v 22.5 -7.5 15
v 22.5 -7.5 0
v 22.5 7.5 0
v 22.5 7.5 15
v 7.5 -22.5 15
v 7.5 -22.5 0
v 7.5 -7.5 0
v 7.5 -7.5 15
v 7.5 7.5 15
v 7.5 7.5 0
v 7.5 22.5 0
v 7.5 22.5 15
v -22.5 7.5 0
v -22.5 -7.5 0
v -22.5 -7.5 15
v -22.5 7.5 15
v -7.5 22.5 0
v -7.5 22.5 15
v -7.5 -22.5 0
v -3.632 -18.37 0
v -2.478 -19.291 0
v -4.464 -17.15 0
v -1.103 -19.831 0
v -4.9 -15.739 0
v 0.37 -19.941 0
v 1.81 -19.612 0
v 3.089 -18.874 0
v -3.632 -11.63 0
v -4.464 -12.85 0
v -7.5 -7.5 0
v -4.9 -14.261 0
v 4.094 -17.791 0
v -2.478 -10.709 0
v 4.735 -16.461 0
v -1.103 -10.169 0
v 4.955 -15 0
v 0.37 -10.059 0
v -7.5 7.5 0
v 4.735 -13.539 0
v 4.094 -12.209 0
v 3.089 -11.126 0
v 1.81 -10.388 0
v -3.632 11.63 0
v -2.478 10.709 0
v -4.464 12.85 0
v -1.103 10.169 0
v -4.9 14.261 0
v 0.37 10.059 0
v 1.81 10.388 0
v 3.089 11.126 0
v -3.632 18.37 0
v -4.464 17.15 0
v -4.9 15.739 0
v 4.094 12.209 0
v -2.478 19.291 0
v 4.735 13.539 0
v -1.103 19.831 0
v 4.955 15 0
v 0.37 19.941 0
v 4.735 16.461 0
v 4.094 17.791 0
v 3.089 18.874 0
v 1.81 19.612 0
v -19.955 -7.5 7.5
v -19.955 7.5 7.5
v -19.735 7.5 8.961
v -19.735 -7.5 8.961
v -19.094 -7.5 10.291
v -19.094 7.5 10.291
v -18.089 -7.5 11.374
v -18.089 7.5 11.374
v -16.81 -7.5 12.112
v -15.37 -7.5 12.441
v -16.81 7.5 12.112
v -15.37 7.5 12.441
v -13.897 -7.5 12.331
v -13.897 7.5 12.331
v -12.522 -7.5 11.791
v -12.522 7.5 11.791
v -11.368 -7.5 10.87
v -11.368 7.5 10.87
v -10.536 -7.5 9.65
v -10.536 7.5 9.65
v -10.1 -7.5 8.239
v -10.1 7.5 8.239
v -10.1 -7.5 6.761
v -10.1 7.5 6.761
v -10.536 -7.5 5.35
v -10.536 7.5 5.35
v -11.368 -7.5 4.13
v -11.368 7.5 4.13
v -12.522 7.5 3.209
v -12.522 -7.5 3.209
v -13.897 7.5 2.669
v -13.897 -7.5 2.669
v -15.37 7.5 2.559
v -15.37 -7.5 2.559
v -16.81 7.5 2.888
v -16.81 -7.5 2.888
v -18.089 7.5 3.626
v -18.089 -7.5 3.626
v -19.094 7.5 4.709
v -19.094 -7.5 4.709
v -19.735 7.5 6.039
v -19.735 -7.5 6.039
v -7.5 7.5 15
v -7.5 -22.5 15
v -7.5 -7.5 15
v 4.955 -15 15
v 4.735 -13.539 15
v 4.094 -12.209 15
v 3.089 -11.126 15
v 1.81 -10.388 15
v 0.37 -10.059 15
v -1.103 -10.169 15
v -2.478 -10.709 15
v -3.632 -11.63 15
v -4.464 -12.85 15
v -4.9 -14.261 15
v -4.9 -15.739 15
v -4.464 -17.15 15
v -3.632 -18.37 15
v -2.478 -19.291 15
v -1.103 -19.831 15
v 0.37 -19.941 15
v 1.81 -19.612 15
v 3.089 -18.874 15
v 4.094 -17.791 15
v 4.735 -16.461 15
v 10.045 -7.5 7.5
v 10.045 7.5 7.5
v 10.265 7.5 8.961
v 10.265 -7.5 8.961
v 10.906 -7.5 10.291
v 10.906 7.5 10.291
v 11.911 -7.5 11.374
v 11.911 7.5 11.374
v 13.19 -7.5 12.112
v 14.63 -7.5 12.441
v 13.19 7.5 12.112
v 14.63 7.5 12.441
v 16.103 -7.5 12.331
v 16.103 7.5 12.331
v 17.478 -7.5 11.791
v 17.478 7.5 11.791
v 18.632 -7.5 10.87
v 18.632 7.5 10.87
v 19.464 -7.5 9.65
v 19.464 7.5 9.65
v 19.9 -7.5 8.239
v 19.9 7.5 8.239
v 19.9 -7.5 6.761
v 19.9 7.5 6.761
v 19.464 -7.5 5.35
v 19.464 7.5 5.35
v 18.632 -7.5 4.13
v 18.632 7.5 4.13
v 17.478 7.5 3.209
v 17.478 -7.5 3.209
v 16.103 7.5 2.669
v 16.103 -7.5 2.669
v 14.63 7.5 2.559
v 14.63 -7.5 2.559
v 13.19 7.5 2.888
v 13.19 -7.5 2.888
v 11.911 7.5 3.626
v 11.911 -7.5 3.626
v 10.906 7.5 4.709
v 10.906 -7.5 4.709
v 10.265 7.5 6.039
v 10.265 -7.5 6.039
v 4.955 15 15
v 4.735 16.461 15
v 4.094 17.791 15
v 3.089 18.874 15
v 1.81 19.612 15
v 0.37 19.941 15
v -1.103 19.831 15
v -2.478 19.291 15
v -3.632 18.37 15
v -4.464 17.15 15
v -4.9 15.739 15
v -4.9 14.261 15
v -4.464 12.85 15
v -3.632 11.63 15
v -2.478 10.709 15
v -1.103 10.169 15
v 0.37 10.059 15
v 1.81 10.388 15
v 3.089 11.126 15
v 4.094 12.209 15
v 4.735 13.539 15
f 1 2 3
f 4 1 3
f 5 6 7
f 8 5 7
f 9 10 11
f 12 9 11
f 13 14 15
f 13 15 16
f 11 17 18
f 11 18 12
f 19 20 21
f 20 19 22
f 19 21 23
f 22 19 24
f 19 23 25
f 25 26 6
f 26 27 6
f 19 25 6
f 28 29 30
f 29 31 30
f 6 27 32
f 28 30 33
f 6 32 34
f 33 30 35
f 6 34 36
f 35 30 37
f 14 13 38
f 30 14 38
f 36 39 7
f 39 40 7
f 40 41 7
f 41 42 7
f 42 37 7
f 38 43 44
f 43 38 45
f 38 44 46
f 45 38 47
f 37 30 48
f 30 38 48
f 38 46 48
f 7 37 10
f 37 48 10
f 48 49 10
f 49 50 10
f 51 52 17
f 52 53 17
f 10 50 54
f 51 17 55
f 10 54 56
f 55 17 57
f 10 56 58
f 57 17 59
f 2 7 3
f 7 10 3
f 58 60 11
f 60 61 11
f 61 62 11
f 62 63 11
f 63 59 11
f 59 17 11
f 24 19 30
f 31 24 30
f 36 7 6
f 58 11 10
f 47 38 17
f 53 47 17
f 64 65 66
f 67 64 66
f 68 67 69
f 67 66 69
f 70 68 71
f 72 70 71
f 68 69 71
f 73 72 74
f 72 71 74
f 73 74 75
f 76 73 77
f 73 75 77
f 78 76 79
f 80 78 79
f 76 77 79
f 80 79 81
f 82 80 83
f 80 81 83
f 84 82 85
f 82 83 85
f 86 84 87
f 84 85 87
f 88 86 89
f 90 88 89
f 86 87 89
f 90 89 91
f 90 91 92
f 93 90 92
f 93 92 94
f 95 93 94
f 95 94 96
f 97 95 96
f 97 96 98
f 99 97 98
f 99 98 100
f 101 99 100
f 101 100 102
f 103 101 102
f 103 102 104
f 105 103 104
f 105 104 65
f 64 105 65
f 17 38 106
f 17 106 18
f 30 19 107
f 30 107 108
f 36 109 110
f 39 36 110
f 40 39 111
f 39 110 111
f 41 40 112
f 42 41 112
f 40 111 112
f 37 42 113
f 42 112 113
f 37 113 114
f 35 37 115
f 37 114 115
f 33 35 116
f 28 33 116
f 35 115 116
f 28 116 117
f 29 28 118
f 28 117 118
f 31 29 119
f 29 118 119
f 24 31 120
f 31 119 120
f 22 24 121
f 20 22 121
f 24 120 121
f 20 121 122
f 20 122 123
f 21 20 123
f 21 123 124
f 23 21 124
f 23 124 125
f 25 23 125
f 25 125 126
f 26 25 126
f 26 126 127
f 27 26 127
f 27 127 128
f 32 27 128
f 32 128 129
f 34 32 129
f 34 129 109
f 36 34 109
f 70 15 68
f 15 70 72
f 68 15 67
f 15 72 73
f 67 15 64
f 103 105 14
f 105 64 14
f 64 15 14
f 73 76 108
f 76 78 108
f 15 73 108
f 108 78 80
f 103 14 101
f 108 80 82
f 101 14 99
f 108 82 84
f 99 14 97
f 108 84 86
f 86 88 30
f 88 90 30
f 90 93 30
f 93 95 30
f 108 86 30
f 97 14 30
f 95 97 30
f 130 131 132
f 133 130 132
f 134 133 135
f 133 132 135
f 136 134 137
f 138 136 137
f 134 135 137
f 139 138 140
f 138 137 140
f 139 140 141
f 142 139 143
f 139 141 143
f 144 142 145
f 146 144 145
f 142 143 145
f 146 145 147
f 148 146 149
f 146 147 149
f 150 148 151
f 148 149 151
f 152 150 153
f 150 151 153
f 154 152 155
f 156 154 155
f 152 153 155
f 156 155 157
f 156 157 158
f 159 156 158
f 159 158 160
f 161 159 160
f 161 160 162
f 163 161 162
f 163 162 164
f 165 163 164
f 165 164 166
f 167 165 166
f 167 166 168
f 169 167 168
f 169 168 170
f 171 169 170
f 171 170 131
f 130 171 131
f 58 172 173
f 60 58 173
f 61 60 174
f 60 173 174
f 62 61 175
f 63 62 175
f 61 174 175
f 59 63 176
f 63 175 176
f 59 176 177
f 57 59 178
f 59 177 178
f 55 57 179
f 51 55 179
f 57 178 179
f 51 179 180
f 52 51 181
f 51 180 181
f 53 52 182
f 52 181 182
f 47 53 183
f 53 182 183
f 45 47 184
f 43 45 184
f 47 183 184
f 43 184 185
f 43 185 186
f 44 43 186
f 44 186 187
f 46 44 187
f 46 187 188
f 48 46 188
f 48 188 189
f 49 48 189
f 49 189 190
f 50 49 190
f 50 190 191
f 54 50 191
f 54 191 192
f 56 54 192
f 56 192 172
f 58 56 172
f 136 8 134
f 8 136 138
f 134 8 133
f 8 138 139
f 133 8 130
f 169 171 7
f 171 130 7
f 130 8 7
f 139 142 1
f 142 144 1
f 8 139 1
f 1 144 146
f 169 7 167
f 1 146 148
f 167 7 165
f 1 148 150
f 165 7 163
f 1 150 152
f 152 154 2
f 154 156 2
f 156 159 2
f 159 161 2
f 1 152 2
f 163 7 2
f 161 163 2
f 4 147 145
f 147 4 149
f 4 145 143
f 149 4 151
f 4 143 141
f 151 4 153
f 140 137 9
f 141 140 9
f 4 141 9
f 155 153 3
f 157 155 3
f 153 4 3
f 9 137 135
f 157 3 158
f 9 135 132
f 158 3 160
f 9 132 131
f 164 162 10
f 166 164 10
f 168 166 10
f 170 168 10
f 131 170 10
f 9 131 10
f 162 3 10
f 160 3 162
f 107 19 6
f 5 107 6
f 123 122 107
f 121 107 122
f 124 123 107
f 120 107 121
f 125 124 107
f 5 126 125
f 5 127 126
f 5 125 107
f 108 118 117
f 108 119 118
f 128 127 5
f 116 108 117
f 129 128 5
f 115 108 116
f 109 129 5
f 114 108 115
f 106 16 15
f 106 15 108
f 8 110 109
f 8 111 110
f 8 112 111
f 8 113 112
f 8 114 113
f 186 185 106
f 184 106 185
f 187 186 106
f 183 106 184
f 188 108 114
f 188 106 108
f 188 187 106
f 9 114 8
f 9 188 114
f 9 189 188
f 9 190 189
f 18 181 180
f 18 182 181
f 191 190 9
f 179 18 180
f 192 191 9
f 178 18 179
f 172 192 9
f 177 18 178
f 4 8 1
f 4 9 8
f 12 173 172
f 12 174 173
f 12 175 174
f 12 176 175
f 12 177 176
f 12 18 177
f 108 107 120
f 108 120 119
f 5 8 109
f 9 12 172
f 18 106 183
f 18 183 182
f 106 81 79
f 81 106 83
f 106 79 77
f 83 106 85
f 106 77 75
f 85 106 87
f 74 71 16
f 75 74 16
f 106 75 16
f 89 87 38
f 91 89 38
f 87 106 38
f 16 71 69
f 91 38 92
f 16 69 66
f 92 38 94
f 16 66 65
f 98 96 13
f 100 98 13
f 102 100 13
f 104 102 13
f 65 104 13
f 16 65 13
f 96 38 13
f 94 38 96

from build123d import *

# Parameters (mm, degrees)
F0_W     = 15
F0_H     = 15
F1_DEPTH = 15
F2_R     = 4.955
F3_DEPTH = 15.001
F4_R     = 4.955
F5_DEPTH = 30.001


with BuildPart() as f1:
    # F0 (on Top) → F1 (new body)
    with BuildSketch(Plane.XY):
        with Locations((-15, 0)):
            Rectangle(F0_W, F0_H)
        Rectangle(F0_W, F0_H)
        with Locations((15, 0)):
            Rectangle(F0_W, F0_H)
        with Locations((0, 15)):
            Rectangle(F0_W, F0_H)
        with Locations((0, -15)):
            Rectangle(F0_W, F0_H)
    extrude(amount=F1_DEPTH)

    # F2 (on face) → F3 (cut, through all)
    with BuildSketch(Plane.XY.offset(15)):
        with Locations((0, -15)):
            Circle(F2_R)
        with Locations((0, 15)):
            Circle(F2_R)
    extrude(amount=-F3_DEPTH, mode=Mode.SUBTRACT)

    # F4 (on face) → F5 (cut, through all)
    with BuildSketch(Plane(origin=(0, 7.5, 0), x_dir=(-1, 0, 0), z_dir=(0, 1, 0))):
        with Locations((15, 7.5)):
            Circle(F4_R)
        with Locations((-15, 7.5)):
            Circle(F4_R)
    extrude(amount=-F5_DEPTH, mode=Mode.SUBTRACT)


solid = f1.part
